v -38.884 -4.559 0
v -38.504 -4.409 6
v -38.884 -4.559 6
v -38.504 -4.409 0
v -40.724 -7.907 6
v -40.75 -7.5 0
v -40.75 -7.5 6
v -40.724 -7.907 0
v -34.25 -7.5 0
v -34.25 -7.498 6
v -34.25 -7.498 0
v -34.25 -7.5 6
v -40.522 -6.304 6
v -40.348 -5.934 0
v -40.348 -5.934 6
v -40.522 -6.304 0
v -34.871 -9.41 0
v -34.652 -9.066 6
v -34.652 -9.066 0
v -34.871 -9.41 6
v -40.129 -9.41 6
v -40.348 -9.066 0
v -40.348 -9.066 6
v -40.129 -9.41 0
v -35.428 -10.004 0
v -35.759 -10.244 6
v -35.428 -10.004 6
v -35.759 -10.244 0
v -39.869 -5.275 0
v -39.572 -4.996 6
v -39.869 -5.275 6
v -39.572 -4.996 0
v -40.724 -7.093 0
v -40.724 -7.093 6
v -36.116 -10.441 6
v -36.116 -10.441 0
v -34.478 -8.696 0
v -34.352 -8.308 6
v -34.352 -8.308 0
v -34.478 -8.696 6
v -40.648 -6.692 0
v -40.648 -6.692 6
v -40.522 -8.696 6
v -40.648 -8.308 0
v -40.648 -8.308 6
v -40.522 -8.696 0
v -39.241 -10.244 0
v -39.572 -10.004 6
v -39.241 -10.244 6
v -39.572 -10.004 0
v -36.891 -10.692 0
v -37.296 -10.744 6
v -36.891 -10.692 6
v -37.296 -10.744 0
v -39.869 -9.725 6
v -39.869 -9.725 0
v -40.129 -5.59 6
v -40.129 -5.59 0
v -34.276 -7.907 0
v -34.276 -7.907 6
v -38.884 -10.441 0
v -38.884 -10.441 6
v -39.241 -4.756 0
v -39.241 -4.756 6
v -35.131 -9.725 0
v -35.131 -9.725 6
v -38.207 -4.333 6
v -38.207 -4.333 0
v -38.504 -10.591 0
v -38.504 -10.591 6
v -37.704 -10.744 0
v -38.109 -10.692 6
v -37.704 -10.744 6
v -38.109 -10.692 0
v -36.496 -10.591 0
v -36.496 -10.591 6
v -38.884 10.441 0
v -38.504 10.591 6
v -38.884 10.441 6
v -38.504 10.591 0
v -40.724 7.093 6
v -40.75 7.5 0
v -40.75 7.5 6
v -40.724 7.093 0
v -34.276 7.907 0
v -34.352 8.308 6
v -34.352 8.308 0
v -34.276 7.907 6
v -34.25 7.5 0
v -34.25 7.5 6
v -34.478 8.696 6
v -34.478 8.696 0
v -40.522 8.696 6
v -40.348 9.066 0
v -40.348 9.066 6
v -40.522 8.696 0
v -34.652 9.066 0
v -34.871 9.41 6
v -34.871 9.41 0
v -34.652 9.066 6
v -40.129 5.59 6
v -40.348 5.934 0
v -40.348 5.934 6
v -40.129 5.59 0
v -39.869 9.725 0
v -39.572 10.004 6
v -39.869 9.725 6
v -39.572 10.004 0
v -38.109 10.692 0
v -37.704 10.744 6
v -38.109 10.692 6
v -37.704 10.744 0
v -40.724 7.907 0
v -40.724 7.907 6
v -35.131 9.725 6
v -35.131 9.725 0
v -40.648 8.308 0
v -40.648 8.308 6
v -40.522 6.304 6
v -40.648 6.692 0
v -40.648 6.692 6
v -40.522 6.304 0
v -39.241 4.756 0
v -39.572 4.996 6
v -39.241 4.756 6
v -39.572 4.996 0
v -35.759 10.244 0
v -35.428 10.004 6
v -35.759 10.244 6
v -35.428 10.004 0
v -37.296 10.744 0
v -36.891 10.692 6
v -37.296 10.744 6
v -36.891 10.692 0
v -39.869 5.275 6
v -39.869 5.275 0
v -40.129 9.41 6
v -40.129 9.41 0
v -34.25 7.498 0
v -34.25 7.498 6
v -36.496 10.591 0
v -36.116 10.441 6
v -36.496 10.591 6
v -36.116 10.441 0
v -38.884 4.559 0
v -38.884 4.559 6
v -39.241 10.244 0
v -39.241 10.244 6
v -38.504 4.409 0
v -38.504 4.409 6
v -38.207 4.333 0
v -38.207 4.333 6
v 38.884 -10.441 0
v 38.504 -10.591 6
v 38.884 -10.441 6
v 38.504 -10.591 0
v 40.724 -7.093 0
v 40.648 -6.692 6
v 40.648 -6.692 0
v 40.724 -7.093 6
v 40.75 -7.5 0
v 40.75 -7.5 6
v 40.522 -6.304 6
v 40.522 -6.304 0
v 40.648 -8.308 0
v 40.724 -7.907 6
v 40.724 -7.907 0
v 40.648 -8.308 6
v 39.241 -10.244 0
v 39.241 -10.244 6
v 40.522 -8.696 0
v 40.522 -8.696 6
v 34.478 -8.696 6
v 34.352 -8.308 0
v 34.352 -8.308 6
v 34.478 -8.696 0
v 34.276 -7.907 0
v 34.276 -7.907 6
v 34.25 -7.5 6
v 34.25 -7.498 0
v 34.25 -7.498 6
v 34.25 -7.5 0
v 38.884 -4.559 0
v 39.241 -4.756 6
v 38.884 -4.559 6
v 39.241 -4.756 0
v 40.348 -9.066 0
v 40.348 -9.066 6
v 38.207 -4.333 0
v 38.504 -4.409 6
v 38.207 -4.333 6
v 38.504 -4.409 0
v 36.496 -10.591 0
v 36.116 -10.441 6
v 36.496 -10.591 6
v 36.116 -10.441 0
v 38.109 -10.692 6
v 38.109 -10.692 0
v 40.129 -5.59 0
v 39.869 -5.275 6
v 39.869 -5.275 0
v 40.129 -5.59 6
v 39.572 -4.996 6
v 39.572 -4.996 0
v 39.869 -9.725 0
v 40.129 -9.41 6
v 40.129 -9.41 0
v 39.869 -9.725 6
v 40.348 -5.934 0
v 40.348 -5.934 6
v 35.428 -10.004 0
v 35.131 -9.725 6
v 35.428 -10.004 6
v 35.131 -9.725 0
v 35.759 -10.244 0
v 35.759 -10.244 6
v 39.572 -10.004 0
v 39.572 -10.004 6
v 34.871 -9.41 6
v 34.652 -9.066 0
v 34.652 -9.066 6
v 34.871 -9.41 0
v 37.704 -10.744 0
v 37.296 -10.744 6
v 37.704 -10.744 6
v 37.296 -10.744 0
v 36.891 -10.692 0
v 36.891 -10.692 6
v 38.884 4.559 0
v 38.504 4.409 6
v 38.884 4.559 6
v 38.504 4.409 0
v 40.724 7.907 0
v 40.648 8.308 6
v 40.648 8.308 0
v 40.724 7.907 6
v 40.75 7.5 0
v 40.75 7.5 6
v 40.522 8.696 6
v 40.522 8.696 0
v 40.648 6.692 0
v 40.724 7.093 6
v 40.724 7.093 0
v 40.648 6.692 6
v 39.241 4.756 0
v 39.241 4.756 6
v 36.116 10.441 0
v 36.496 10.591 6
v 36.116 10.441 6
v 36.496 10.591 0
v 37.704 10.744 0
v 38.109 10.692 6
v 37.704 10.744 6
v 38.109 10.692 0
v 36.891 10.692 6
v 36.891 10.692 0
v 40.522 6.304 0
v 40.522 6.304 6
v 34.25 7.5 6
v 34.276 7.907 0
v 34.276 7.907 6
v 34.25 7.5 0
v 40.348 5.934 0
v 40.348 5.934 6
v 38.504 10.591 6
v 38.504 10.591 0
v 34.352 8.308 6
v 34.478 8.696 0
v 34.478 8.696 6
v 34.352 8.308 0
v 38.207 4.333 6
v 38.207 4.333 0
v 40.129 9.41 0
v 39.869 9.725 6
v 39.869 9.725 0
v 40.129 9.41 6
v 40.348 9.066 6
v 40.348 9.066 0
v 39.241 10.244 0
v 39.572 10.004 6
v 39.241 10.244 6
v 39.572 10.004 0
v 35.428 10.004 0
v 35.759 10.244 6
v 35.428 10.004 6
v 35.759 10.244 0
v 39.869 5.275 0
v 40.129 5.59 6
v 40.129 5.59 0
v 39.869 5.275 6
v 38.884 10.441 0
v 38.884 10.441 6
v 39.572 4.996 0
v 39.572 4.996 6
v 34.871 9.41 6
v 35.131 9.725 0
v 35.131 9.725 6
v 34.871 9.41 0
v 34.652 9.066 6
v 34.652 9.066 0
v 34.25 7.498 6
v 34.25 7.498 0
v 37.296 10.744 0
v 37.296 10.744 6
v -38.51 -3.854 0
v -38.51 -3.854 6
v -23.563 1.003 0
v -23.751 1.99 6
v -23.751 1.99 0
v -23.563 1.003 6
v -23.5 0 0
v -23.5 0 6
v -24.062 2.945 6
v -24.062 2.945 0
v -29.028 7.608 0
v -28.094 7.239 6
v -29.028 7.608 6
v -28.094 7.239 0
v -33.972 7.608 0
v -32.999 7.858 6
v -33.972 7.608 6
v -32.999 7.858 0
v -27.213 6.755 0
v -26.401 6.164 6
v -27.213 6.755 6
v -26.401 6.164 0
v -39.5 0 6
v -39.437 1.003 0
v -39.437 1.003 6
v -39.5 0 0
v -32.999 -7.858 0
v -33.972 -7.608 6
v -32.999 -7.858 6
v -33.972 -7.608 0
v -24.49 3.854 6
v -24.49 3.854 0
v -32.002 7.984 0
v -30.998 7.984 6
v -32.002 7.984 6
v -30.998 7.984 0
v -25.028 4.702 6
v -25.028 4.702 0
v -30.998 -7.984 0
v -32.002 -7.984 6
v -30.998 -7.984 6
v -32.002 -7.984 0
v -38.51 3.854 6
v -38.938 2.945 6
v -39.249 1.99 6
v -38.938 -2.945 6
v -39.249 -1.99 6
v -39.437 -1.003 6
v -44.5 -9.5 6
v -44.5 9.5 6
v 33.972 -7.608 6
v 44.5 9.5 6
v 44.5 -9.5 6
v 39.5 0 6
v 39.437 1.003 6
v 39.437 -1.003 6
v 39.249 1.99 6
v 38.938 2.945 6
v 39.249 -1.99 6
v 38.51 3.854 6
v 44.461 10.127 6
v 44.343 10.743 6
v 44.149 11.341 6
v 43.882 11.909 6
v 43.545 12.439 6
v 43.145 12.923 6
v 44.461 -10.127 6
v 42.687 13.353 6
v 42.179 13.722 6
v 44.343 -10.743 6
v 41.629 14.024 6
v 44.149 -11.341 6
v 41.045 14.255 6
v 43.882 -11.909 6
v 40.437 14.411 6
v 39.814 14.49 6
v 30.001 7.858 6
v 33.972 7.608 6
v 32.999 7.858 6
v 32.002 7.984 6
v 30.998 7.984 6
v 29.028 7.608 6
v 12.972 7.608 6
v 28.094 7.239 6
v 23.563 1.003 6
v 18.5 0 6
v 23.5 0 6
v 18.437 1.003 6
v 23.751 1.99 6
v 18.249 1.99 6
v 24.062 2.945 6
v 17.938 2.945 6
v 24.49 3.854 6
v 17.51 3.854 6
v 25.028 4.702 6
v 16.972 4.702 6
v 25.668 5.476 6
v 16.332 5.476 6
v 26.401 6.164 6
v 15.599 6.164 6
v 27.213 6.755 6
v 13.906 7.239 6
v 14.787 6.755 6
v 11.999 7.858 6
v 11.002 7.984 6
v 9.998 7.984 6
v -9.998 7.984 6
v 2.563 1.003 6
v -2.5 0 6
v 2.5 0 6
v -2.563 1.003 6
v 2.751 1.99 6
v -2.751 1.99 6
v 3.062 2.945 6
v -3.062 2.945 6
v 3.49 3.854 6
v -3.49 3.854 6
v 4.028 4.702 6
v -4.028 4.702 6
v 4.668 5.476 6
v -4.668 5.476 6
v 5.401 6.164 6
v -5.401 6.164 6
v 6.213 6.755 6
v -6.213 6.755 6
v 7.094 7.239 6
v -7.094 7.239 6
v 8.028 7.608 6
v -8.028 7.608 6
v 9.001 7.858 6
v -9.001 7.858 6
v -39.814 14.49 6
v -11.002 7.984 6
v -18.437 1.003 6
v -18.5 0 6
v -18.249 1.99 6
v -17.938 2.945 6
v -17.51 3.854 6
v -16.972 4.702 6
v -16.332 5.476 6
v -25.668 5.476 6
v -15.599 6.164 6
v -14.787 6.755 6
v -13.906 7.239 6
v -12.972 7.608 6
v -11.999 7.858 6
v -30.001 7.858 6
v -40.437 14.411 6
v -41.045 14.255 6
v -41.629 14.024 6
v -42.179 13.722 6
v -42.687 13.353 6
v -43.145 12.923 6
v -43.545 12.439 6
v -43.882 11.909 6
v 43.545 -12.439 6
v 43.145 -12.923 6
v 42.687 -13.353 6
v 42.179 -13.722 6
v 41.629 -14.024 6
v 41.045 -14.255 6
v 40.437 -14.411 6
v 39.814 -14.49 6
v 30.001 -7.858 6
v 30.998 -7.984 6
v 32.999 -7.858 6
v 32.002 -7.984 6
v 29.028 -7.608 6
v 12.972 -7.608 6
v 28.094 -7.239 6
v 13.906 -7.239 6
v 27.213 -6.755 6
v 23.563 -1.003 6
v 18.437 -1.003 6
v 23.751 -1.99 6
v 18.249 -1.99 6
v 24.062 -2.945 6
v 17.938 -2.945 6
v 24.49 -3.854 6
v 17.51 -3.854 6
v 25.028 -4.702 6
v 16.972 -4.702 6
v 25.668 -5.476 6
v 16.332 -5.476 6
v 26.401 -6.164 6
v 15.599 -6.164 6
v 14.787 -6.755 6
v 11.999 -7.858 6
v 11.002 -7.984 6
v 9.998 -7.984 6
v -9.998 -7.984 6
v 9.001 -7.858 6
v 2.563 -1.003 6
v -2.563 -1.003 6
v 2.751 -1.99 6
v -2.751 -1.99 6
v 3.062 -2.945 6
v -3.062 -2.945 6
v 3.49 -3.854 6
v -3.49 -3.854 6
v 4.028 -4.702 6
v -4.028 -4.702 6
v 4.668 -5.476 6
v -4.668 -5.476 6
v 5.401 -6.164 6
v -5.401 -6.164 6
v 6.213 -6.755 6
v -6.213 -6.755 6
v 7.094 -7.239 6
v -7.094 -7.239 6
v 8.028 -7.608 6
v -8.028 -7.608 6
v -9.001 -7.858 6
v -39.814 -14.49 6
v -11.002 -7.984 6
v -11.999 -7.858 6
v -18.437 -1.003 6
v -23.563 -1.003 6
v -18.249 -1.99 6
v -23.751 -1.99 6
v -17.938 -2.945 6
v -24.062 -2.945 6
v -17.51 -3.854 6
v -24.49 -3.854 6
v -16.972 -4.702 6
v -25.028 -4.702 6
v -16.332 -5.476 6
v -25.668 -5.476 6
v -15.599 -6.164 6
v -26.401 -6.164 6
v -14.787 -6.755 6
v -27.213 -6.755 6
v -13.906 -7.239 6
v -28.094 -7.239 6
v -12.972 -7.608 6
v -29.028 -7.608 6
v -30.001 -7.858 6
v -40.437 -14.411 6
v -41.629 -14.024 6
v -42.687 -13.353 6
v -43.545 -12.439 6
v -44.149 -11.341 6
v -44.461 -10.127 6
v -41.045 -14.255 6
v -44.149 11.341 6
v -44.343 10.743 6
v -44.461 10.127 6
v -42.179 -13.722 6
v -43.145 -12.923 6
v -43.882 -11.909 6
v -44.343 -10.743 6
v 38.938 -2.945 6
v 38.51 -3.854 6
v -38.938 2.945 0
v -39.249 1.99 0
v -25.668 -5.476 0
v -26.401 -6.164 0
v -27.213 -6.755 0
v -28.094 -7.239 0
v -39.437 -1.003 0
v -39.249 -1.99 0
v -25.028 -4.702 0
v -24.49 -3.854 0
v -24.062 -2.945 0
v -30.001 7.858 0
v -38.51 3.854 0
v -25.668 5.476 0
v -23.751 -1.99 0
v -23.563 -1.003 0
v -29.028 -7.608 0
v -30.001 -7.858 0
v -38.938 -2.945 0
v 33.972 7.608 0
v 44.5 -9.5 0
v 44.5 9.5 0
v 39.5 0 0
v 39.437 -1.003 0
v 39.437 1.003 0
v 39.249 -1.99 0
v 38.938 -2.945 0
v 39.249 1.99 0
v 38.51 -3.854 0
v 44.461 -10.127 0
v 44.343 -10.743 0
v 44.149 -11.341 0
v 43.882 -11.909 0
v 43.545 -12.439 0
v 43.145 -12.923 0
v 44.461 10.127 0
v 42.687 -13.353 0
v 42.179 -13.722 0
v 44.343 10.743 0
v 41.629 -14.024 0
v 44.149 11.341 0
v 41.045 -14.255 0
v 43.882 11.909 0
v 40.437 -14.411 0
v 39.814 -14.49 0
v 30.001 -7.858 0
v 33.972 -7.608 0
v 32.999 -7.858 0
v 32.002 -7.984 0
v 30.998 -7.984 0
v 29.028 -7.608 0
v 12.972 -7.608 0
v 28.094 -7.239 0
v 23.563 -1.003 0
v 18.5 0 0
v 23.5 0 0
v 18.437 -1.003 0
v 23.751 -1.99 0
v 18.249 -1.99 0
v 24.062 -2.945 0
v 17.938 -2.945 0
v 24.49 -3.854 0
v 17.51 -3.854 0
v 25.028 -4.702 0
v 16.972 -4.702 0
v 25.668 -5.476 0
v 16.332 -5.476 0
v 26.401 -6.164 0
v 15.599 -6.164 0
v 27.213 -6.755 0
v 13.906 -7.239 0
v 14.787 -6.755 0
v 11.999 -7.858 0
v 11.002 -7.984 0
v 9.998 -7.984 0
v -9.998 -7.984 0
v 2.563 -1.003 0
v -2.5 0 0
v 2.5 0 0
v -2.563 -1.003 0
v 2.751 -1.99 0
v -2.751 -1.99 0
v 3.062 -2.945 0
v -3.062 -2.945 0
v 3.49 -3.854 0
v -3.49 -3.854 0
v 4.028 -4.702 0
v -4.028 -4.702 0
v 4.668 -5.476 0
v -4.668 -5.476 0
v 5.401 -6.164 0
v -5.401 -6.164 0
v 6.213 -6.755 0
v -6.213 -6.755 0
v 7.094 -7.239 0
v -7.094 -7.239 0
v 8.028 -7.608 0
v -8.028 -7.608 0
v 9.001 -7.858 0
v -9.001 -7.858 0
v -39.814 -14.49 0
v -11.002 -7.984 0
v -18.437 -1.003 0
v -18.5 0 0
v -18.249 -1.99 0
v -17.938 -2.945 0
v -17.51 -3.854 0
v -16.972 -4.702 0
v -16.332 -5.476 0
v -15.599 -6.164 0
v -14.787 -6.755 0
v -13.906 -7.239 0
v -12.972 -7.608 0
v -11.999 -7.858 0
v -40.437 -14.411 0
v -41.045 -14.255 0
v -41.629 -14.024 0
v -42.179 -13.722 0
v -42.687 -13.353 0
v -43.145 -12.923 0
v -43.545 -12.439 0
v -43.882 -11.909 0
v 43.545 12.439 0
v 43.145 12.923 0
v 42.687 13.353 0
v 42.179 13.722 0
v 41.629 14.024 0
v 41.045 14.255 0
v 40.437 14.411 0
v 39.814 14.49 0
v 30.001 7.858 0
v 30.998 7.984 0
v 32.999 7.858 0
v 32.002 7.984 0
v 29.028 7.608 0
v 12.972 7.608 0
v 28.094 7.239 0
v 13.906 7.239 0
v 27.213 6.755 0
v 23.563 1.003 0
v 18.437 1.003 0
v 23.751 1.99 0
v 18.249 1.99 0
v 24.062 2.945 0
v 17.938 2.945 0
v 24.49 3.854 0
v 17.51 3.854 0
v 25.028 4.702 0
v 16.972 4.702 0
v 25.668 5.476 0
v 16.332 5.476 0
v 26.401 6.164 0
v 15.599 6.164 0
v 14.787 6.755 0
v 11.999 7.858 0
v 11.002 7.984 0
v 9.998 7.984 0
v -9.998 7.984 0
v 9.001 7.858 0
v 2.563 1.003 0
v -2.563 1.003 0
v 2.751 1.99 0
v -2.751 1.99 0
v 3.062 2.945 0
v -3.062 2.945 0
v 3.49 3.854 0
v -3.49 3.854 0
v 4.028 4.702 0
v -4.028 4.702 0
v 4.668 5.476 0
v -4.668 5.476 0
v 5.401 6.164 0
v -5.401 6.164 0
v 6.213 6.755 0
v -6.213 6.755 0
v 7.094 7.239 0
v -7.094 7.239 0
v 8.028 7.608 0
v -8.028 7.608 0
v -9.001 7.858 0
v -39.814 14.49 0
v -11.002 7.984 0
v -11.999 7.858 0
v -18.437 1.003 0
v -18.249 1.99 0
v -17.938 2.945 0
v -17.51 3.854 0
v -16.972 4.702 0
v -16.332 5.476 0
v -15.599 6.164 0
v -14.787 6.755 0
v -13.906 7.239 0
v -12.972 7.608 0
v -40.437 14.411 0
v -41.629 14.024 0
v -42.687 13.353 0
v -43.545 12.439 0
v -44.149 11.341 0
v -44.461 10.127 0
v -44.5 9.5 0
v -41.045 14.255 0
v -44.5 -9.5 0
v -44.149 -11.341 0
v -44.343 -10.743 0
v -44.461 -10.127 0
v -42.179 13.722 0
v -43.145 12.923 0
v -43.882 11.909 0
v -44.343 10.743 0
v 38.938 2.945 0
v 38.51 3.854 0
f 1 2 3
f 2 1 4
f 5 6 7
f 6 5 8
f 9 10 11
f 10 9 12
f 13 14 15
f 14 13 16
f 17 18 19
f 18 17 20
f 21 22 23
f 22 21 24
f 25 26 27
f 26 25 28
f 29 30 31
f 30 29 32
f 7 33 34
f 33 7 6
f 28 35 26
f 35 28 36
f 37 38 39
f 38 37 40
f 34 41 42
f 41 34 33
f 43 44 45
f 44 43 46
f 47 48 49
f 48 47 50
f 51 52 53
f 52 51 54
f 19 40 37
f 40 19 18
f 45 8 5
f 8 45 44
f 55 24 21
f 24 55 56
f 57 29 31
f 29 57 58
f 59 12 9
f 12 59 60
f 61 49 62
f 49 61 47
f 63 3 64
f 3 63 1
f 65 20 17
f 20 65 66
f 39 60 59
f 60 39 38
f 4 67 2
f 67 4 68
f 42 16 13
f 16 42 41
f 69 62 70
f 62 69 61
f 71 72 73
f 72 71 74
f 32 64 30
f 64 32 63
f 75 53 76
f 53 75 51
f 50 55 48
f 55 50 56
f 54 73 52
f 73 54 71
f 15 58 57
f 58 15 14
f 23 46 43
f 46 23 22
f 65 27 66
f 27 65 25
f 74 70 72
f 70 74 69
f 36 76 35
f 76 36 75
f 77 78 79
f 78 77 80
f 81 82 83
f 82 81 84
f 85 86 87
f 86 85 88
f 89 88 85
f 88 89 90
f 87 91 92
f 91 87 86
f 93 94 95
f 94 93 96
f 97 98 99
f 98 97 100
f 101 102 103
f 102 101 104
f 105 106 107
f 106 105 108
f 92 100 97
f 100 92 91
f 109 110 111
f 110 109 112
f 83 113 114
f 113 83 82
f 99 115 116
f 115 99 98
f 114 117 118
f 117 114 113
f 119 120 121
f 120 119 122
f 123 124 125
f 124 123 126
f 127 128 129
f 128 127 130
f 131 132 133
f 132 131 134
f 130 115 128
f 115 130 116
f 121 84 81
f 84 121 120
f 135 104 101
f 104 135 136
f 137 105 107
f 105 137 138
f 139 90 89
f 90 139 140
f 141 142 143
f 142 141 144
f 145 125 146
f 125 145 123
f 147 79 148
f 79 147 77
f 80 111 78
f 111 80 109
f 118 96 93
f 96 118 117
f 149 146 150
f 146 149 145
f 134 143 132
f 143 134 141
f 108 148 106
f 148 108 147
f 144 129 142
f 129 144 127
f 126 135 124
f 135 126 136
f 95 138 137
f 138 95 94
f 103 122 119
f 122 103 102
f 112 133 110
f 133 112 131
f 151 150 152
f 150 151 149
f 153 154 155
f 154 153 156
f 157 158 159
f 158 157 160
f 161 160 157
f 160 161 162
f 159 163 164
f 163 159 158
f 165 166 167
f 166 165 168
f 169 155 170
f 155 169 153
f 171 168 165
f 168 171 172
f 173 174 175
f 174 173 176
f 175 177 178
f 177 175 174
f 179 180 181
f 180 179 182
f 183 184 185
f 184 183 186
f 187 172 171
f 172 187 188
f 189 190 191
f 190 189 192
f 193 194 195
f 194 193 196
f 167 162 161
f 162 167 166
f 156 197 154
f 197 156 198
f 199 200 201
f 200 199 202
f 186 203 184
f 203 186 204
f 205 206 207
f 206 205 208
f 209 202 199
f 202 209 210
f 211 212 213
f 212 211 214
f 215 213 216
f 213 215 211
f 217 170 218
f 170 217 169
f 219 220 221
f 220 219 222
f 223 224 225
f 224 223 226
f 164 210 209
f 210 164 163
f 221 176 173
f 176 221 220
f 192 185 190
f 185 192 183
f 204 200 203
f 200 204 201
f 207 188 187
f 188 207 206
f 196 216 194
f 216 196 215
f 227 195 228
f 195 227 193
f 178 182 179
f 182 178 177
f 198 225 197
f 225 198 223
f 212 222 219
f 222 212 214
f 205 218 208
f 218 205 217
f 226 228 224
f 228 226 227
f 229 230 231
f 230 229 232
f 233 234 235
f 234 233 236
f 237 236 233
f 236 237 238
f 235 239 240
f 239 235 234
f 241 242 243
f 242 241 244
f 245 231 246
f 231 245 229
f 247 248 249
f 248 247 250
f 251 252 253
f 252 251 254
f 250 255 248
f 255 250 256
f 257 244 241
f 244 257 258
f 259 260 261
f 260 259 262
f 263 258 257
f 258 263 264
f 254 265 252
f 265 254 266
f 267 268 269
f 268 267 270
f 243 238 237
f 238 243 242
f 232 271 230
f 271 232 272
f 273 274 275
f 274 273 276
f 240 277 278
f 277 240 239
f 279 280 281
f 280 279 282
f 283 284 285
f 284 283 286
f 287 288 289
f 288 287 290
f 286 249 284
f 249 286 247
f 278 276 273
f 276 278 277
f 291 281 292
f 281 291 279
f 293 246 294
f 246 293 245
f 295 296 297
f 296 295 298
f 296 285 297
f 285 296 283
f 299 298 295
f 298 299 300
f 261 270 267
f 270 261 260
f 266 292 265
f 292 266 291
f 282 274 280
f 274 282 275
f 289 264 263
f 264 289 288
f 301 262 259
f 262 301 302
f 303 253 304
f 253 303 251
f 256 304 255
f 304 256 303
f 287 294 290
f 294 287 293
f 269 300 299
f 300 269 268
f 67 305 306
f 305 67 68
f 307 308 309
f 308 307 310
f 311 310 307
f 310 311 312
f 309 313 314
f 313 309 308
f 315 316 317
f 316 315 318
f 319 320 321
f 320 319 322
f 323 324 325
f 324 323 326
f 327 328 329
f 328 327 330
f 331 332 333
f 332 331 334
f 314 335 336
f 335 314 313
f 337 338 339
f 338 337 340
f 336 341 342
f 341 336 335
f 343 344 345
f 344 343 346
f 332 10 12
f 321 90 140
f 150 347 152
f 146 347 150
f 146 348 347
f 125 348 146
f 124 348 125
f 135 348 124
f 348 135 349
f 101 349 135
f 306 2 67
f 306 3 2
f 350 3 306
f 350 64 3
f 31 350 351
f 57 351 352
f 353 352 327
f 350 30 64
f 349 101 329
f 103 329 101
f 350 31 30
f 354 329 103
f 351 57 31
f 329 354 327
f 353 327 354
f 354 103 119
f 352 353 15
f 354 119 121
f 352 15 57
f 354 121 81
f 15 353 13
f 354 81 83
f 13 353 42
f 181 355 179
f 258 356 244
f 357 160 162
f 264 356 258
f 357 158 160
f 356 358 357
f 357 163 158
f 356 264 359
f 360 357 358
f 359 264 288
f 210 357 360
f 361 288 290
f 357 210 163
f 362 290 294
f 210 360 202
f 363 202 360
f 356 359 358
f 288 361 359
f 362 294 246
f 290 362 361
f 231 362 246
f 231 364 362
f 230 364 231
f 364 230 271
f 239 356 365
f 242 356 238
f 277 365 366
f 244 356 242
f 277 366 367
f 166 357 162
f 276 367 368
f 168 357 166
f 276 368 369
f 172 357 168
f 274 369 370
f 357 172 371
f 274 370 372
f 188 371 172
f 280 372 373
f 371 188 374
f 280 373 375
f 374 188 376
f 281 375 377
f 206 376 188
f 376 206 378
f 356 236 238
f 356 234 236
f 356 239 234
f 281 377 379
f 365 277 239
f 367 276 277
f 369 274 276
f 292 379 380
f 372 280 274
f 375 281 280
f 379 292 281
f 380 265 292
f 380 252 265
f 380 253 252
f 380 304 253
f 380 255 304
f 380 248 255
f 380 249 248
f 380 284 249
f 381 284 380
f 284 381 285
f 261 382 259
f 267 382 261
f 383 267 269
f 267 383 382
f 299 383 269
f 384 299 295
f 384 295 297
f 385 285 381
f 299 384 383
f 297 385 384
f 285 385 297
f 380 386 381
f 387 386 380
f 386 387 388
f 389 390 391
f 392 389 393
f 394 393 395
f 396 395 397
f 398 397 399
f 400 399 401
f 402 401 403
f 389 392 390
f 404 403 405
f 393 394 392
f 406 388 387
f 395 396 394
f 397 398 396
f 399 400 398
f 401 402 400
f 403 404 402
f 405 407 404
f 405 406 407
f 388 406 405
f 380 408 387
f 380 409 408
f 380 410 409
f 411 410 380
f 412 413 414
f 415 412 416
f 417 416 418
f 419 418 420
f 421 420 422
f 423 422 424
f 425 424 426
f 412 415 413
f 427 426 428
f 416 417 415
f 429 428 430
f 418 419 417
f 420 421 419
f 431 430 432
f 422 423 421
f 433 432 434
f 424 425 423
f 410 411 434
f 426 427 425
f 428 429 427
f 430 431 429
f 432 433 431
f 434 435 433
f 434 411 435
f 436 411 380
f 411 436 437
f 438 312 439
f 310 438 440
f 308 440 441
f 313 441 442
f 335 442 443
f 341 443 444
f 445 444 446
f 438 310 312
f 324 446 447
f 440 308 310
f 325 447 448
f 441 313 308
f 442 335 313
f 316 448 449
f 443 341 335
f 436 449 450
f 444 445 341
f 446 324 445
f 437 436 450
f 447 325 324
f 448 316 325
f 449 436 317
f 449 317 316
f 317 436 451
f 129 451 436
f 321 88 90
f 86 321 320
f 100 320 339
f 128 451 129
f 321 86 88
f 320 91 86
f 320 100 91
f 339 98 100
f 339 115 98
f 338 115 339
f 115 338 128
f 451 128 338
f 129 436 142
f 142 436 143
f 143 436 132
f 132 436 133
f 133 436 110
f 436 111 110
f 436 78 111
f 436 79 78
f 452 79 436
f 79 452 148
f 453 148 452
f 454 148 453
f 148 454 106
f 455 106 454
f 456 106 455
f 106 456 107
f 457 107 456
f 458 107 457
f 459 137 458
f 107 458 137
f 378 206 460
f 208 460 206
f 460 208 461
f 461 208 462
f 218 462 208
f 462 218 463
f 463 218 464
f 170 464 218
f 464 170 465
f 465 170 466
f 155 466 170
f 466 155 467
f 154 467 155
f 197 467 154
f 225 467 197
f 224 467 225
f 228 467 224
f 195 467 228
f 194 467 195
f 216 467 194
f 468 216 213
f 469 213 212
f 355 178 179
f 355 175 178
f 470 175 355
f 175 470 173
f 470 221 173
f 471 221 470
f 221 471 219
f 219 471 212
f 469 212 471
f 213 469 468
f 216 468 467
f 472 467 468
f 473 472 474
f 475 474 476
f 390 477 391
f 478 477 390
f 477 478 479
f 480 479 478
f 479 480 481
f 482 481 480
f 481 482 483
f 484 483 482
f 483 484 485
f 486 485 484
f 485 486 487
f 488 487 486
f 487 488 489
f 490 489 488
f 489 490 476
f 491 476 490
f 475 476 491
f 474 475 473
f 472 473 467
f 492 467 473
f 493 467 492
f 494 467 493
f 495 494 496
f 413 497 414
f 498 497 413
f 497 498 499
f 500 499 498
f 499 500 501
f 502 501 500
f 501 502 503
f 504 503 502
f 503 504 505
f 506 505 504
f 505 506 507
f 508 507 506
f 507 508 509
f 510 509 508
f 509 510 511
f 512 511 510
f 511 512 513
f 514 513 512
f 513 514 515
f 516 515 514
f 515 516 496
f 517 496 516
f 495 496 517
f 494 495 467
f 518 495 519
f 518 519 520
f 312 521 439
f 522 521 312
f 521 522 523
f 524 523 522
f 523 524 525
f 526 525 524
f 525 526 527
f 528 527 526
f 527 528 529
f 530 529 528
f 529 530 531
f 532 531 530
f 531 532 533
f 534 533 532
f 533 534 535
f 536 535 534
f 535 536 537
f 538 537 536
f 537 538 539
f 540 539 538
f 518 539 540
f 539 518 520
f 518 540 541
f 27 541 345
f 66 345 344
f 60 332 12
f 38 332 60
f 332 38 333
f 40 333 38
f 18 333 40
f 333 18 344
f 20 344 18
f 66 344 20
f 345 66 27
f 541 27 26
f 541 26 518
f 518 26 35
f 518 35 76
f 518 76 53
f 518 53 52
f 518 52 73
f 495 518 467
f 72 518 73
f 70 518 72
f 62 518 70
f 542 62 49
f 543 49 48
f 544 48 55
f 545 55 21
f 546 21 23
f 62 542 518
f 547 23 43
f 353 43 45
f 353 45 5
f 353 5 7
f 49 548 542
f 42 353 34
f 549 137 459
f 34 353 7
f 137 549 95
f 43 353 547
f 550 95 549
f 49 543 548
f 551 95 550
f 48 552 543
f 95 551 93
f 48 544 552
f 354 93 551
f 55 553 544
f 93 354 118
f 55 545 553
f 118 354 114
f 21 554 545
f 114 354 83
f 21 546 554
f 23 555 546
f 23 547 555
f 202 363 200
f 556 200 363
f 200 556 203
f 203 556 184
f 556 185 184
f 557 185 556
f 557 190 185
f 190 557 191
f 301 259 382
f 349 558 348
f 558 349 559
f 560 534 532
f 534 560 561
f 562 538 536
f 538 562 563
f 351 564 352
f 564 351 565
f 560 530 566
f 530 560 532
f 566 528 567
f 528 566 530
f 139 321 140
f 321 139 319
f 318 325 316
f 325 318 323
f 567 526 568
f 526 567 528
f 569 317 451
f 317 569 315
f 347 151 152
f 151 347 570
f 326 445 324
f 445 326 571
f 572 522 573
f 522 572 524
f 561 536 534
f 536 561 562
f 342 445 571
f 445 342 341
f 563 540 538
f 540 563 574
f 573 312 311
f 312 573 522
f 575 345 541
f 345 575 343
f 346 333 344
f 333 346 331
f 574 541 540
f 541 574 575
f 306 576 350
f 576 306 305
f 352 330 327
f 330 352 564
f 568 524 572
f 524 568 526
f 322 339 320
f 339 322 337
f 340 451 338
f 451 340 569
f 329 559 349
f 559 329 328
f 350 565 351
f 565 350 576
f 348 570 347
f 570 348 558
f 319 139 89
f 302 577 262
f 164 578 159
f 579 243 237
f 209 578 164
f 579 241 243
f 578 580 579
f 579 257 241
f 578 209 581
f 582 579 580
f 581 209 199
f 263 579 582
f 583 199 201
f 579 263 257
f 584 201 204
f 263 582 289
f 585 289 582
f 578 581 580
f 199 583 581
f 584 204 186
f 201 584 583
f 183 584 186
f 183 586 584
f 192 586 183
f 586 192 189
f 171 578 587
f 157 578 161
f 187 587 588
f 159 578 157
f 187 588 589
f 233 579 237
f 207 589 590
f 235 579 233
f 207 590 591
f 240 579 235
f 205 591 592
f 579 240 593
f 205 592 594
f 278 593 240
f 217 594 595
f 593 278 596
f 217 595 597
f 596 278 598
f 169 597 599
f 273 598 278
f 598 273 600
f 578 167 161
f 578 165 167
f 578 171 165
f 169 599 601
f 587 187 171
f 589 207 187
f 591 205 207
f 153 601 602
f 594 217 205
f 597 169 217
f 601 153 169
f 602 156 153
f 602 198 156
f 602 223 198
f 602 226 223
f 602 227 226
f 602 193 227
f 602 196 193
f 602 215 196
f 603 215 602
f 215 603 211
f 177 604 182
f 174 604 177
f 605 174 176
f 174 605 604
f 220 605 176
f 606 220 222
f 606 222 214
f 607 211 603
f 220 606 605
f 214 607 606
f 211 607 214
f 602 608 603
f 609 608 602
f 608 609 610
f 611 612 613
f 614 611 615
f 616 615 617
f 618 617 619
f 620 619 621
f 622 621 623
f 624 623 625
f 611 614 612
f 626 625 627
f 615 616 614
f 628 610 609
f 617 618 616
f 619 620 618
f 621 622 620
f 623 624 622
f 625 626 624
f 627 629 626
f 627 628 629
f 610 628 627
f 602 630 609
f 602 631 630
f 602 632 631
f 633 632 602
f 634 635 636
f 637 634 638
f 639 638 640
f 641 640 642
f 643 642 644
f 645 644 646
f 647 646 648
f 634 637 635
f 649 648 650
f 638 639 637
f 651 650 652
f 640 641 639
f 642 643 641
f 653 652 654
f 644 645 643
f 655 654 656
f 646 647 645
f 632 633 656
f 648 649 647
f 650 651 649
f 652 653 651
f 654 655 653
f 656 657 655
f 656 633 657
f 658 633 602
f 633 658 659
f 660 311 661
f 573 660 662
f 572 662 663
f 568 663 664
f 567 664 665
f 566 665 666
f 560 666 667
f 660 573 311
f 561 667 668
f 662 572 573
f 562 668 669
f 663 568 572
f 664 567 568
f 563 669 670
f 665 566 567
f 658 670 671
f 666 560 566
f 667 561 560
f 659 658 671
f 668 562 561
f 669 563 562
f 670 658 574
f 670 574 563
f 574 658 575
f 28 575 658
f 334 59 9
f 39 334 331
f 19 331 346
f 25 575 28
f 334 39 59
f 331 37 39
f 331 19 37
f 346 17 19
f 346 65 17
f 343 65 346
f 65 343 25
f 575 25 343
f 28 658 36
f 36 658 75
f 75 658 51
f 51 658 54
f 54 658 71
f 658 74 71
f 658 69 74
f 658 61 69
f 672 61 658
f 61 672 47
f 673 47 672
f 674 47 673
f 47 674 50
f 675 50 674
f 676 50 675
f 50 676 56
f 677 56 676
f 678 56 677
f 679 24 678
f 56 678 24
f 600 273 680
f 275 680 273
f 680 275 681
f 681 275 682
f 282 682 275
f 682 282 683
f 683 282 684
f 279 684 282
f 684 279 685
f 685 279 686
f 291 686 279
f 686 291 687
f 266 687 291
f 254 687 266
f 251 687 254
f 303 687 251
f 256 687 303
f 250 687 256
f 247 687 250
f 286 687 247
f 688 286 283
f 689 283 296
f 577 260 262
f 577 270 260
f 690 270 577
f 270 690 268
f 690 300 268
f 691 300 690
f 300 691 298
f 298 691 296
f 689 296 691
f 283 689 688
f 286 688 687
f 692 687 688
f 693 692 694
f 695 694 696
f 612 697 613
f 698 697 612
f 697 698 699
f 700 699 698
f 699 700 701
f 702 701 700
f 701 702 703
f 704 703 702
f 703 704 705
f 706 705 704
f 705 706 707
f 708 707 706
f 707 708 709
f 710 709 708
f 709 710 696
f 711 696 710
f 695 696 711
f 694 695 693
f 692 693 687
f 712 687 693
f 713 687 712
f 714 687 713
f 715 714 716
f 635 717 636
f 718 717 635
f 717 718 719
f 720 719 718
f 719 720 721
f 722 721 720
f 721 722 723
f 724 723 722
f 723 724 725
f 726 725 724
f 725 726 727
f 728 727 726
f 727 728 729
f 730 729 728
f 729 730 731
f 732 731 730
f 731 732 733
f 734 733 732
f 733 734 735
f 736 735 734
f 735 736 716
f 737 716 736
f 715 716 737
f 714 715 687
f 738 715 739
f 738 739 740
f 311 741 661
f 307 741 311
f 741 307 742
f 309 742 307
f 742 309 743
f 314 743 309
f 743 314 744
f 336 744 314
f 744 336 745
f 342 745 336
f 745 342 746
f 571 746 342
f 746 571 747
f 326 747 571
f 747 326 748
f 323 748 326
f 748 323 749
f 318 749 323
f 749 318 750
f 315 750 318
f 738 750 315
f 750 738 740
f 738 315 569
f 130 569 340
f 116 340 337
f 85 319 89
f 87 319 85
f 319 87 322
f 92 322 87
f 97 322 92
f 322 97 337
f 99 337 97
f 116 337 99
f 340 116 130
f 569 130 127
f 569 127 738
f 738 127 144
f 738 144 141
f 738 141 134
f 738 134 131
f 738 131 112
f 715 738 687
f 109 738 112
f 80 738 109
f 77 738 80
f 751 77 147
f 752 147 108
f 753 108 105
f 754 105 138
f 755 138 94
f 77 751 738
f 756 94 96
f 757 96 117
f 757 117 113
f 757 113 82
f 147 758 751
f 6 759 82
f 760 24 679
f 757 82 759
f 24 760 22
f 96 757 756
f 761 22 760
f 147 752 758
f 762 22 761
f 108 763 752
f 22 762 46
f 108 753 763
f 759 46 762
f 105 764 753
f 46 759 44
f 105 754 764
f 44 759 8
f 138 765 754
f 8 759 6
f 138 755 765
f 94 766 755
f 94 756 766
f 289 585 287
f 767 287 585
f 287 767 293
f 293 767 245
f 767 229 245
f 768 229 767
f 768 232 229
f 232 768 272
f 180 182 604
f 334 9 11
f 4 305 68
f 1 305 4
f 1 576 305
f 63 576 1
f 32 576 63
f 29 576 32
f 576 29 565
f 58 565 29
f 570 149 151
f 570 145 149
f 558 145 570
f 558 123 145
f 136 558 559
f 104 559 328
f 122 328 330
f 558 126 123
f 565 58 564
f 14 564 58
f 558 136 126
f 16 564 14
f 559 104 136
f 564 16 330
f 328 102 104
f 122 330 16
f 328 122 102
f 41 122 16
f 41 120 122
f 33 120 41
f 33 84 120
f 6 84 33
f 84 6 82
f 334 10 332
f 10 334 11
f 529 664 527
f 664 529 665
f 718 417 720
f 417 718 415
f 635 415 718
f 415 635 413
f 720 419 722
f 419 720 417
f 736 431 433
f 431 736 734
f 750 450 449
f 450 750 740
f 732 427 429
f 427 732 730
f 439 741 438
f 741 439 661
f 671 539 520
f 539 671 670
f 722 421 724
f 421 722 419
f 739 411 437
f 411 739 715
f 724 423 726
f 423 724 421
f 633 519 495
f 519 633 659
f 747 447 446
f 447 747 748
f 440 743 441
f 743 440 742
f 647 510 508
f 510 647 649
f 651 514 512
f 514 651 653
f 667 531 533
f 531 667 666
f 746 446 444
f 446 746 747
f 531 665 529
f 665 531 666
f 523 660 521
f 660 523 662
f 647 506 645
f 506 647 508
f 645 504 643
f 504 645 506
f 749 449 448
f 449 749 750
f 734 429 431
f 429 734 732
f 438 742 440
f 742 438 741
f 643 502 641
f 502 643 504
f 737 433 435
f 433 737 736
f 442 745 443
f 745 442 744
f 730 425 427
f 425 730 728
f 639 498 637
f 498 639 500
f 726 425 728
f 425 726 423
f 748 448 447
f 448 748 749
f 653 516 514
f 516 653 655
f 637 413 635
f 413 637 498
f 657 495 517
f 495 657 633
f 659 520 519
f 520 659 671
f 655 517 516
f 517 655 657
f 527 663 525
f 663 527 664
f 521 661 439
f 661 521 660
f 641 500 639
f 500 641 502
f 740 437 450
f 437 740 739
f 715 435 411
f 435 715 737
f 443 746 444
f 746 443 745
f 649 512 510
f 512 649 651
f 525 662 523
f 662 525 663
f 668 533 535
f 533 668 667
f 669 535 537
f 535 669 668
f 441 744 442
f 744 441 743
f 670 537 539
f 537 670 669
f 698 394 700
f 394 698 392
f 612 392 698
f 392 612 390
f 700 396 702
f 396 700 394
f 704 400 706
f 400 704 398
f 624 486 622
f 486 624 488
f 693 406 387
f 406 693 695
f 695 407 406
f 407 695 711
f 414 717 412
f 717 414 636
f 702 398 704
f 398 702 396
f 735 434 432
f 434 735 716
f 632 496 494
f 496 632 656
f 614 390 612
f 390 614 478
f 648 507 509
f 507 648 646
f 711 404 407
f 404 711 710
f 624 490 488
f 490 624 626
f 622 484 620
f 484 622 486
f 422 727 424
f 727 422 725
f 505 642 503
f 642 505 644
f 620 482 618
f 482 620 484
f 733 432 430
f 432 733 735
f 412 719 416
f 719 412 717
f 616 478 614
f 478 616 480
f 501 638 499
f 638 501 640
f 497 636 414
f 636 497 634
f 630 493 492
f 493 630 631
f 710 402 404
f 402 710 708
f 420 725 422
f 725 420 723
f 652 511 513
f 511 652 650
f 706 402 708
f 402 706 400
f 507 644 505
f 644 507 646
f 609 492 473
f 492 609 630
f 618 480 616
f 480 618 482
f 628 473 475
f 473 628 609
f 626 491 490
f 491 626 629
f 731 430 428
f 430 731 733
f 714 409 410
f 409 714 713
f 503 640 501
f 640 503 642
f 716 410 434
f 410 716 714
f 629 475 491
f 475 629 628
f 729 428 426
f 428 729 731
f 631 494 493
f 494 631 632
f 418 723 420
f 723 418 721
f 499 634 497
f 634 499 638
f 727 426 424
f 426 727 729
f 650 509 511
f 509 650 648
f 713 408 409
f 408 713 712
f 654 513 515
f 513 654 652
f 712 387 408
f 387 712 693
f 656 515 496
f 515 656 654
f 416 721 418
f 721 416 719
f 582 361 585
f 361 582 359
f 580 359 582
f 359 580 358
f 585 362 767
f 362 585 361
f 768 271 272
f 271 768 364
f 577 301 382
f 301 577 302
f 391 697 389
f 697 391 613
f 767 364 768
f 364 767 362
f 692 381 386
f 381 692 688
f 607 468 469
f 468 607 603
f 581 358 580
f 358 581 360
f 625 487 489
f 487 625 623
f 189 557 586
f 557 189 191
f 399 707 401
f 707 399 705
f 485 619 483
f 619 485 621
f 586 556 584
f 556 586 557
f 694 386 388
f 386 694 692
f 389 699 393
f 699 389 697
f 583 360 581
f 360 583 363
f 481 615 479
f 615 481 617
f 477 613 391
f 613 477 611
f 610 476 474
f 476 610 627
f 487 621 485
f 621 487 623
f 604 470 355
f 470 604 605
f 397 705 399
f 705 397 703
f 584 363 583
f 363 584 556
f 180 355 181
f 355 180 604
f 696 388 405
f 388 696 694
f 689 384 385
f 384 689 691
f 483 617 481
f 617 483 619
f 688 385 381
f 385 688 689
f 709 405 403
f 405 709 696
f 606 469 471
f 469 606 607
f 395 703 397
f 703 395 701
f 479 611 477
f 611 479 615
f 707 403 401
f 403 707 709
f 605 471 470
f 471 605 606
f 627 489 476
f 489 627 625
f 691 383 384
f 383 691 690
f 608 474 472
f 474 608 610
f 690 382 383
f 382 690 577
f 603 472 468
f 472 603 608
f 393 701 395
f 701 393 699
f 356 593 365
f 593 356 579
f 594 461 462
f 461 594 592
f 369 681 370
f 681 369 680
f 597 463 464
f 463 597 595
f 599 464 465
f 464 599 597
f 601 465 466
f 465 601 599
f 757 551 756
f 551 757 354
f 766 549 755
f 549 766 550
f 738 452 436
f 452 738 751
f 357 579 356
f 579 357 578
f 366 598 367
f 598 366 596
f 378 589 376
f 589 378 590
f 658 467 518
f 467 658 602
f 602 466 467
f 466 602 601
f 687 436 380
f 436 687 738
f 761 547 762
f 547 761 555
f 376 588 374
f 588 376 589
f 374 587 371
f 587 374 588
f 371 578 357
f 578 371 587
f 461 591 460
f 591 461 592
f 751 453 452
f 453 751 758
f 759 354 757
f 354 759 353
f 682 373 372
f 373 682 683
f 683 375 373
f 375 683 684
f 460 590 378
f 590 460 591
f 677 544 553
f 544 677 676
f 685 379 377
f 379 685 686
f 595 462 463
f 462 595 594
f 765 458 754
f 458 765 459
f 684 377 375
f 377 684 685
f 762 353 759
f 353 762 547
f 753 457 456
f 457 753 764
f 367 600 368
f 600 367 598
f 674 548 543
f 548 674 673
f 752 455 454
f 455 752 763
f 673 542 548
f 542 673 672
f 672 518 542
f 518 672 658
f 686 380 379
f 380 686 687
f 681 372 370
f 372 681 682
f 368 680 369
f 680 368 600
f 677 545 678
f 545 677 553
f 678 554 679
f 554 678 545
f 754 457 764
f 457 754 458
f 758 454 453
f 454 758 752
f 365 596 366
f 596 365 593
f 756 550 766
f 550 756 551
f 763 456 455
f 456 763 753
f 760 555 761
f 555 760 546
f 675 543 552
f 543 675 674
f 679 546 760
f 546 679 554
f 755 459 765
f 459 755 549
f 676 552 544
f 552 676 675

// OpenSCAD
$fn = 50;

difference() {
	union() {
		hull() {
			translate(v = [-39.5, 9.5, 0]) {
				cylinder(h = 6, r = 5);
			}
			translate(v = [39.5, 9.5, 0]) {
				cylinder(h = 6, r = 5);
			}
			translate(v = [-39.5, -9.5, 0]) {
				cylinder(h = 6, r = 5);
			}
			translate(v = [39.5, -9.5, 0]) {
				cylinder(h = 6, r = 5);
			}
		}
	}
	union() {
		translate(v = [-37.5, -7.5, -100.0]) {
			cylinder(h = 200, r = 3.25);
		}
		translate(v = [-37.5, 7.5, -100.0]) {
			cylinder(h = 200, r = 3.25);
		}
		translate(v = [37.5, -7.5, -100.0]) {
			cylinder(h = 200, r = 3.25);
		}
		translate(v = [37.5, 7.5, -100.0]) {
			cylinder(h = 200, r = 3.25);
		}
		translate(v = [-37.5, -7.5, -100.0]) {
			cylinder(h = 200, r = 1.8);
		}
		translate(v = [-37.5, 7.5, -100.0]) {
			cylinder(h = 200, r = 1.8);
		}
		translate(v = [37.5, -7.5, -100.0]) {
			cylinder(h = 200, r = 1.8);
		}
		translate(v = [37.5, 7.5, -100.0]) {
			cylinder(h = 200, r = 1.8);
		}
		translate(v = [-31.5, 0, 0.0]) {
			cylinder(h = 6, r = 8.0);
		}
		translate(v = [-10.5, 0, 0.0]) {
			cylinder(h = 6, r = 8.0);
		}
		translate(v = [10.5, 0, 0.0]) {
			cylinder(h = 6, r = 8.0);
		}
		translate(v = [31.5, 0, 0.0]) {
			cylinder(h = 6, r = 8.0);
		}
	}
}
